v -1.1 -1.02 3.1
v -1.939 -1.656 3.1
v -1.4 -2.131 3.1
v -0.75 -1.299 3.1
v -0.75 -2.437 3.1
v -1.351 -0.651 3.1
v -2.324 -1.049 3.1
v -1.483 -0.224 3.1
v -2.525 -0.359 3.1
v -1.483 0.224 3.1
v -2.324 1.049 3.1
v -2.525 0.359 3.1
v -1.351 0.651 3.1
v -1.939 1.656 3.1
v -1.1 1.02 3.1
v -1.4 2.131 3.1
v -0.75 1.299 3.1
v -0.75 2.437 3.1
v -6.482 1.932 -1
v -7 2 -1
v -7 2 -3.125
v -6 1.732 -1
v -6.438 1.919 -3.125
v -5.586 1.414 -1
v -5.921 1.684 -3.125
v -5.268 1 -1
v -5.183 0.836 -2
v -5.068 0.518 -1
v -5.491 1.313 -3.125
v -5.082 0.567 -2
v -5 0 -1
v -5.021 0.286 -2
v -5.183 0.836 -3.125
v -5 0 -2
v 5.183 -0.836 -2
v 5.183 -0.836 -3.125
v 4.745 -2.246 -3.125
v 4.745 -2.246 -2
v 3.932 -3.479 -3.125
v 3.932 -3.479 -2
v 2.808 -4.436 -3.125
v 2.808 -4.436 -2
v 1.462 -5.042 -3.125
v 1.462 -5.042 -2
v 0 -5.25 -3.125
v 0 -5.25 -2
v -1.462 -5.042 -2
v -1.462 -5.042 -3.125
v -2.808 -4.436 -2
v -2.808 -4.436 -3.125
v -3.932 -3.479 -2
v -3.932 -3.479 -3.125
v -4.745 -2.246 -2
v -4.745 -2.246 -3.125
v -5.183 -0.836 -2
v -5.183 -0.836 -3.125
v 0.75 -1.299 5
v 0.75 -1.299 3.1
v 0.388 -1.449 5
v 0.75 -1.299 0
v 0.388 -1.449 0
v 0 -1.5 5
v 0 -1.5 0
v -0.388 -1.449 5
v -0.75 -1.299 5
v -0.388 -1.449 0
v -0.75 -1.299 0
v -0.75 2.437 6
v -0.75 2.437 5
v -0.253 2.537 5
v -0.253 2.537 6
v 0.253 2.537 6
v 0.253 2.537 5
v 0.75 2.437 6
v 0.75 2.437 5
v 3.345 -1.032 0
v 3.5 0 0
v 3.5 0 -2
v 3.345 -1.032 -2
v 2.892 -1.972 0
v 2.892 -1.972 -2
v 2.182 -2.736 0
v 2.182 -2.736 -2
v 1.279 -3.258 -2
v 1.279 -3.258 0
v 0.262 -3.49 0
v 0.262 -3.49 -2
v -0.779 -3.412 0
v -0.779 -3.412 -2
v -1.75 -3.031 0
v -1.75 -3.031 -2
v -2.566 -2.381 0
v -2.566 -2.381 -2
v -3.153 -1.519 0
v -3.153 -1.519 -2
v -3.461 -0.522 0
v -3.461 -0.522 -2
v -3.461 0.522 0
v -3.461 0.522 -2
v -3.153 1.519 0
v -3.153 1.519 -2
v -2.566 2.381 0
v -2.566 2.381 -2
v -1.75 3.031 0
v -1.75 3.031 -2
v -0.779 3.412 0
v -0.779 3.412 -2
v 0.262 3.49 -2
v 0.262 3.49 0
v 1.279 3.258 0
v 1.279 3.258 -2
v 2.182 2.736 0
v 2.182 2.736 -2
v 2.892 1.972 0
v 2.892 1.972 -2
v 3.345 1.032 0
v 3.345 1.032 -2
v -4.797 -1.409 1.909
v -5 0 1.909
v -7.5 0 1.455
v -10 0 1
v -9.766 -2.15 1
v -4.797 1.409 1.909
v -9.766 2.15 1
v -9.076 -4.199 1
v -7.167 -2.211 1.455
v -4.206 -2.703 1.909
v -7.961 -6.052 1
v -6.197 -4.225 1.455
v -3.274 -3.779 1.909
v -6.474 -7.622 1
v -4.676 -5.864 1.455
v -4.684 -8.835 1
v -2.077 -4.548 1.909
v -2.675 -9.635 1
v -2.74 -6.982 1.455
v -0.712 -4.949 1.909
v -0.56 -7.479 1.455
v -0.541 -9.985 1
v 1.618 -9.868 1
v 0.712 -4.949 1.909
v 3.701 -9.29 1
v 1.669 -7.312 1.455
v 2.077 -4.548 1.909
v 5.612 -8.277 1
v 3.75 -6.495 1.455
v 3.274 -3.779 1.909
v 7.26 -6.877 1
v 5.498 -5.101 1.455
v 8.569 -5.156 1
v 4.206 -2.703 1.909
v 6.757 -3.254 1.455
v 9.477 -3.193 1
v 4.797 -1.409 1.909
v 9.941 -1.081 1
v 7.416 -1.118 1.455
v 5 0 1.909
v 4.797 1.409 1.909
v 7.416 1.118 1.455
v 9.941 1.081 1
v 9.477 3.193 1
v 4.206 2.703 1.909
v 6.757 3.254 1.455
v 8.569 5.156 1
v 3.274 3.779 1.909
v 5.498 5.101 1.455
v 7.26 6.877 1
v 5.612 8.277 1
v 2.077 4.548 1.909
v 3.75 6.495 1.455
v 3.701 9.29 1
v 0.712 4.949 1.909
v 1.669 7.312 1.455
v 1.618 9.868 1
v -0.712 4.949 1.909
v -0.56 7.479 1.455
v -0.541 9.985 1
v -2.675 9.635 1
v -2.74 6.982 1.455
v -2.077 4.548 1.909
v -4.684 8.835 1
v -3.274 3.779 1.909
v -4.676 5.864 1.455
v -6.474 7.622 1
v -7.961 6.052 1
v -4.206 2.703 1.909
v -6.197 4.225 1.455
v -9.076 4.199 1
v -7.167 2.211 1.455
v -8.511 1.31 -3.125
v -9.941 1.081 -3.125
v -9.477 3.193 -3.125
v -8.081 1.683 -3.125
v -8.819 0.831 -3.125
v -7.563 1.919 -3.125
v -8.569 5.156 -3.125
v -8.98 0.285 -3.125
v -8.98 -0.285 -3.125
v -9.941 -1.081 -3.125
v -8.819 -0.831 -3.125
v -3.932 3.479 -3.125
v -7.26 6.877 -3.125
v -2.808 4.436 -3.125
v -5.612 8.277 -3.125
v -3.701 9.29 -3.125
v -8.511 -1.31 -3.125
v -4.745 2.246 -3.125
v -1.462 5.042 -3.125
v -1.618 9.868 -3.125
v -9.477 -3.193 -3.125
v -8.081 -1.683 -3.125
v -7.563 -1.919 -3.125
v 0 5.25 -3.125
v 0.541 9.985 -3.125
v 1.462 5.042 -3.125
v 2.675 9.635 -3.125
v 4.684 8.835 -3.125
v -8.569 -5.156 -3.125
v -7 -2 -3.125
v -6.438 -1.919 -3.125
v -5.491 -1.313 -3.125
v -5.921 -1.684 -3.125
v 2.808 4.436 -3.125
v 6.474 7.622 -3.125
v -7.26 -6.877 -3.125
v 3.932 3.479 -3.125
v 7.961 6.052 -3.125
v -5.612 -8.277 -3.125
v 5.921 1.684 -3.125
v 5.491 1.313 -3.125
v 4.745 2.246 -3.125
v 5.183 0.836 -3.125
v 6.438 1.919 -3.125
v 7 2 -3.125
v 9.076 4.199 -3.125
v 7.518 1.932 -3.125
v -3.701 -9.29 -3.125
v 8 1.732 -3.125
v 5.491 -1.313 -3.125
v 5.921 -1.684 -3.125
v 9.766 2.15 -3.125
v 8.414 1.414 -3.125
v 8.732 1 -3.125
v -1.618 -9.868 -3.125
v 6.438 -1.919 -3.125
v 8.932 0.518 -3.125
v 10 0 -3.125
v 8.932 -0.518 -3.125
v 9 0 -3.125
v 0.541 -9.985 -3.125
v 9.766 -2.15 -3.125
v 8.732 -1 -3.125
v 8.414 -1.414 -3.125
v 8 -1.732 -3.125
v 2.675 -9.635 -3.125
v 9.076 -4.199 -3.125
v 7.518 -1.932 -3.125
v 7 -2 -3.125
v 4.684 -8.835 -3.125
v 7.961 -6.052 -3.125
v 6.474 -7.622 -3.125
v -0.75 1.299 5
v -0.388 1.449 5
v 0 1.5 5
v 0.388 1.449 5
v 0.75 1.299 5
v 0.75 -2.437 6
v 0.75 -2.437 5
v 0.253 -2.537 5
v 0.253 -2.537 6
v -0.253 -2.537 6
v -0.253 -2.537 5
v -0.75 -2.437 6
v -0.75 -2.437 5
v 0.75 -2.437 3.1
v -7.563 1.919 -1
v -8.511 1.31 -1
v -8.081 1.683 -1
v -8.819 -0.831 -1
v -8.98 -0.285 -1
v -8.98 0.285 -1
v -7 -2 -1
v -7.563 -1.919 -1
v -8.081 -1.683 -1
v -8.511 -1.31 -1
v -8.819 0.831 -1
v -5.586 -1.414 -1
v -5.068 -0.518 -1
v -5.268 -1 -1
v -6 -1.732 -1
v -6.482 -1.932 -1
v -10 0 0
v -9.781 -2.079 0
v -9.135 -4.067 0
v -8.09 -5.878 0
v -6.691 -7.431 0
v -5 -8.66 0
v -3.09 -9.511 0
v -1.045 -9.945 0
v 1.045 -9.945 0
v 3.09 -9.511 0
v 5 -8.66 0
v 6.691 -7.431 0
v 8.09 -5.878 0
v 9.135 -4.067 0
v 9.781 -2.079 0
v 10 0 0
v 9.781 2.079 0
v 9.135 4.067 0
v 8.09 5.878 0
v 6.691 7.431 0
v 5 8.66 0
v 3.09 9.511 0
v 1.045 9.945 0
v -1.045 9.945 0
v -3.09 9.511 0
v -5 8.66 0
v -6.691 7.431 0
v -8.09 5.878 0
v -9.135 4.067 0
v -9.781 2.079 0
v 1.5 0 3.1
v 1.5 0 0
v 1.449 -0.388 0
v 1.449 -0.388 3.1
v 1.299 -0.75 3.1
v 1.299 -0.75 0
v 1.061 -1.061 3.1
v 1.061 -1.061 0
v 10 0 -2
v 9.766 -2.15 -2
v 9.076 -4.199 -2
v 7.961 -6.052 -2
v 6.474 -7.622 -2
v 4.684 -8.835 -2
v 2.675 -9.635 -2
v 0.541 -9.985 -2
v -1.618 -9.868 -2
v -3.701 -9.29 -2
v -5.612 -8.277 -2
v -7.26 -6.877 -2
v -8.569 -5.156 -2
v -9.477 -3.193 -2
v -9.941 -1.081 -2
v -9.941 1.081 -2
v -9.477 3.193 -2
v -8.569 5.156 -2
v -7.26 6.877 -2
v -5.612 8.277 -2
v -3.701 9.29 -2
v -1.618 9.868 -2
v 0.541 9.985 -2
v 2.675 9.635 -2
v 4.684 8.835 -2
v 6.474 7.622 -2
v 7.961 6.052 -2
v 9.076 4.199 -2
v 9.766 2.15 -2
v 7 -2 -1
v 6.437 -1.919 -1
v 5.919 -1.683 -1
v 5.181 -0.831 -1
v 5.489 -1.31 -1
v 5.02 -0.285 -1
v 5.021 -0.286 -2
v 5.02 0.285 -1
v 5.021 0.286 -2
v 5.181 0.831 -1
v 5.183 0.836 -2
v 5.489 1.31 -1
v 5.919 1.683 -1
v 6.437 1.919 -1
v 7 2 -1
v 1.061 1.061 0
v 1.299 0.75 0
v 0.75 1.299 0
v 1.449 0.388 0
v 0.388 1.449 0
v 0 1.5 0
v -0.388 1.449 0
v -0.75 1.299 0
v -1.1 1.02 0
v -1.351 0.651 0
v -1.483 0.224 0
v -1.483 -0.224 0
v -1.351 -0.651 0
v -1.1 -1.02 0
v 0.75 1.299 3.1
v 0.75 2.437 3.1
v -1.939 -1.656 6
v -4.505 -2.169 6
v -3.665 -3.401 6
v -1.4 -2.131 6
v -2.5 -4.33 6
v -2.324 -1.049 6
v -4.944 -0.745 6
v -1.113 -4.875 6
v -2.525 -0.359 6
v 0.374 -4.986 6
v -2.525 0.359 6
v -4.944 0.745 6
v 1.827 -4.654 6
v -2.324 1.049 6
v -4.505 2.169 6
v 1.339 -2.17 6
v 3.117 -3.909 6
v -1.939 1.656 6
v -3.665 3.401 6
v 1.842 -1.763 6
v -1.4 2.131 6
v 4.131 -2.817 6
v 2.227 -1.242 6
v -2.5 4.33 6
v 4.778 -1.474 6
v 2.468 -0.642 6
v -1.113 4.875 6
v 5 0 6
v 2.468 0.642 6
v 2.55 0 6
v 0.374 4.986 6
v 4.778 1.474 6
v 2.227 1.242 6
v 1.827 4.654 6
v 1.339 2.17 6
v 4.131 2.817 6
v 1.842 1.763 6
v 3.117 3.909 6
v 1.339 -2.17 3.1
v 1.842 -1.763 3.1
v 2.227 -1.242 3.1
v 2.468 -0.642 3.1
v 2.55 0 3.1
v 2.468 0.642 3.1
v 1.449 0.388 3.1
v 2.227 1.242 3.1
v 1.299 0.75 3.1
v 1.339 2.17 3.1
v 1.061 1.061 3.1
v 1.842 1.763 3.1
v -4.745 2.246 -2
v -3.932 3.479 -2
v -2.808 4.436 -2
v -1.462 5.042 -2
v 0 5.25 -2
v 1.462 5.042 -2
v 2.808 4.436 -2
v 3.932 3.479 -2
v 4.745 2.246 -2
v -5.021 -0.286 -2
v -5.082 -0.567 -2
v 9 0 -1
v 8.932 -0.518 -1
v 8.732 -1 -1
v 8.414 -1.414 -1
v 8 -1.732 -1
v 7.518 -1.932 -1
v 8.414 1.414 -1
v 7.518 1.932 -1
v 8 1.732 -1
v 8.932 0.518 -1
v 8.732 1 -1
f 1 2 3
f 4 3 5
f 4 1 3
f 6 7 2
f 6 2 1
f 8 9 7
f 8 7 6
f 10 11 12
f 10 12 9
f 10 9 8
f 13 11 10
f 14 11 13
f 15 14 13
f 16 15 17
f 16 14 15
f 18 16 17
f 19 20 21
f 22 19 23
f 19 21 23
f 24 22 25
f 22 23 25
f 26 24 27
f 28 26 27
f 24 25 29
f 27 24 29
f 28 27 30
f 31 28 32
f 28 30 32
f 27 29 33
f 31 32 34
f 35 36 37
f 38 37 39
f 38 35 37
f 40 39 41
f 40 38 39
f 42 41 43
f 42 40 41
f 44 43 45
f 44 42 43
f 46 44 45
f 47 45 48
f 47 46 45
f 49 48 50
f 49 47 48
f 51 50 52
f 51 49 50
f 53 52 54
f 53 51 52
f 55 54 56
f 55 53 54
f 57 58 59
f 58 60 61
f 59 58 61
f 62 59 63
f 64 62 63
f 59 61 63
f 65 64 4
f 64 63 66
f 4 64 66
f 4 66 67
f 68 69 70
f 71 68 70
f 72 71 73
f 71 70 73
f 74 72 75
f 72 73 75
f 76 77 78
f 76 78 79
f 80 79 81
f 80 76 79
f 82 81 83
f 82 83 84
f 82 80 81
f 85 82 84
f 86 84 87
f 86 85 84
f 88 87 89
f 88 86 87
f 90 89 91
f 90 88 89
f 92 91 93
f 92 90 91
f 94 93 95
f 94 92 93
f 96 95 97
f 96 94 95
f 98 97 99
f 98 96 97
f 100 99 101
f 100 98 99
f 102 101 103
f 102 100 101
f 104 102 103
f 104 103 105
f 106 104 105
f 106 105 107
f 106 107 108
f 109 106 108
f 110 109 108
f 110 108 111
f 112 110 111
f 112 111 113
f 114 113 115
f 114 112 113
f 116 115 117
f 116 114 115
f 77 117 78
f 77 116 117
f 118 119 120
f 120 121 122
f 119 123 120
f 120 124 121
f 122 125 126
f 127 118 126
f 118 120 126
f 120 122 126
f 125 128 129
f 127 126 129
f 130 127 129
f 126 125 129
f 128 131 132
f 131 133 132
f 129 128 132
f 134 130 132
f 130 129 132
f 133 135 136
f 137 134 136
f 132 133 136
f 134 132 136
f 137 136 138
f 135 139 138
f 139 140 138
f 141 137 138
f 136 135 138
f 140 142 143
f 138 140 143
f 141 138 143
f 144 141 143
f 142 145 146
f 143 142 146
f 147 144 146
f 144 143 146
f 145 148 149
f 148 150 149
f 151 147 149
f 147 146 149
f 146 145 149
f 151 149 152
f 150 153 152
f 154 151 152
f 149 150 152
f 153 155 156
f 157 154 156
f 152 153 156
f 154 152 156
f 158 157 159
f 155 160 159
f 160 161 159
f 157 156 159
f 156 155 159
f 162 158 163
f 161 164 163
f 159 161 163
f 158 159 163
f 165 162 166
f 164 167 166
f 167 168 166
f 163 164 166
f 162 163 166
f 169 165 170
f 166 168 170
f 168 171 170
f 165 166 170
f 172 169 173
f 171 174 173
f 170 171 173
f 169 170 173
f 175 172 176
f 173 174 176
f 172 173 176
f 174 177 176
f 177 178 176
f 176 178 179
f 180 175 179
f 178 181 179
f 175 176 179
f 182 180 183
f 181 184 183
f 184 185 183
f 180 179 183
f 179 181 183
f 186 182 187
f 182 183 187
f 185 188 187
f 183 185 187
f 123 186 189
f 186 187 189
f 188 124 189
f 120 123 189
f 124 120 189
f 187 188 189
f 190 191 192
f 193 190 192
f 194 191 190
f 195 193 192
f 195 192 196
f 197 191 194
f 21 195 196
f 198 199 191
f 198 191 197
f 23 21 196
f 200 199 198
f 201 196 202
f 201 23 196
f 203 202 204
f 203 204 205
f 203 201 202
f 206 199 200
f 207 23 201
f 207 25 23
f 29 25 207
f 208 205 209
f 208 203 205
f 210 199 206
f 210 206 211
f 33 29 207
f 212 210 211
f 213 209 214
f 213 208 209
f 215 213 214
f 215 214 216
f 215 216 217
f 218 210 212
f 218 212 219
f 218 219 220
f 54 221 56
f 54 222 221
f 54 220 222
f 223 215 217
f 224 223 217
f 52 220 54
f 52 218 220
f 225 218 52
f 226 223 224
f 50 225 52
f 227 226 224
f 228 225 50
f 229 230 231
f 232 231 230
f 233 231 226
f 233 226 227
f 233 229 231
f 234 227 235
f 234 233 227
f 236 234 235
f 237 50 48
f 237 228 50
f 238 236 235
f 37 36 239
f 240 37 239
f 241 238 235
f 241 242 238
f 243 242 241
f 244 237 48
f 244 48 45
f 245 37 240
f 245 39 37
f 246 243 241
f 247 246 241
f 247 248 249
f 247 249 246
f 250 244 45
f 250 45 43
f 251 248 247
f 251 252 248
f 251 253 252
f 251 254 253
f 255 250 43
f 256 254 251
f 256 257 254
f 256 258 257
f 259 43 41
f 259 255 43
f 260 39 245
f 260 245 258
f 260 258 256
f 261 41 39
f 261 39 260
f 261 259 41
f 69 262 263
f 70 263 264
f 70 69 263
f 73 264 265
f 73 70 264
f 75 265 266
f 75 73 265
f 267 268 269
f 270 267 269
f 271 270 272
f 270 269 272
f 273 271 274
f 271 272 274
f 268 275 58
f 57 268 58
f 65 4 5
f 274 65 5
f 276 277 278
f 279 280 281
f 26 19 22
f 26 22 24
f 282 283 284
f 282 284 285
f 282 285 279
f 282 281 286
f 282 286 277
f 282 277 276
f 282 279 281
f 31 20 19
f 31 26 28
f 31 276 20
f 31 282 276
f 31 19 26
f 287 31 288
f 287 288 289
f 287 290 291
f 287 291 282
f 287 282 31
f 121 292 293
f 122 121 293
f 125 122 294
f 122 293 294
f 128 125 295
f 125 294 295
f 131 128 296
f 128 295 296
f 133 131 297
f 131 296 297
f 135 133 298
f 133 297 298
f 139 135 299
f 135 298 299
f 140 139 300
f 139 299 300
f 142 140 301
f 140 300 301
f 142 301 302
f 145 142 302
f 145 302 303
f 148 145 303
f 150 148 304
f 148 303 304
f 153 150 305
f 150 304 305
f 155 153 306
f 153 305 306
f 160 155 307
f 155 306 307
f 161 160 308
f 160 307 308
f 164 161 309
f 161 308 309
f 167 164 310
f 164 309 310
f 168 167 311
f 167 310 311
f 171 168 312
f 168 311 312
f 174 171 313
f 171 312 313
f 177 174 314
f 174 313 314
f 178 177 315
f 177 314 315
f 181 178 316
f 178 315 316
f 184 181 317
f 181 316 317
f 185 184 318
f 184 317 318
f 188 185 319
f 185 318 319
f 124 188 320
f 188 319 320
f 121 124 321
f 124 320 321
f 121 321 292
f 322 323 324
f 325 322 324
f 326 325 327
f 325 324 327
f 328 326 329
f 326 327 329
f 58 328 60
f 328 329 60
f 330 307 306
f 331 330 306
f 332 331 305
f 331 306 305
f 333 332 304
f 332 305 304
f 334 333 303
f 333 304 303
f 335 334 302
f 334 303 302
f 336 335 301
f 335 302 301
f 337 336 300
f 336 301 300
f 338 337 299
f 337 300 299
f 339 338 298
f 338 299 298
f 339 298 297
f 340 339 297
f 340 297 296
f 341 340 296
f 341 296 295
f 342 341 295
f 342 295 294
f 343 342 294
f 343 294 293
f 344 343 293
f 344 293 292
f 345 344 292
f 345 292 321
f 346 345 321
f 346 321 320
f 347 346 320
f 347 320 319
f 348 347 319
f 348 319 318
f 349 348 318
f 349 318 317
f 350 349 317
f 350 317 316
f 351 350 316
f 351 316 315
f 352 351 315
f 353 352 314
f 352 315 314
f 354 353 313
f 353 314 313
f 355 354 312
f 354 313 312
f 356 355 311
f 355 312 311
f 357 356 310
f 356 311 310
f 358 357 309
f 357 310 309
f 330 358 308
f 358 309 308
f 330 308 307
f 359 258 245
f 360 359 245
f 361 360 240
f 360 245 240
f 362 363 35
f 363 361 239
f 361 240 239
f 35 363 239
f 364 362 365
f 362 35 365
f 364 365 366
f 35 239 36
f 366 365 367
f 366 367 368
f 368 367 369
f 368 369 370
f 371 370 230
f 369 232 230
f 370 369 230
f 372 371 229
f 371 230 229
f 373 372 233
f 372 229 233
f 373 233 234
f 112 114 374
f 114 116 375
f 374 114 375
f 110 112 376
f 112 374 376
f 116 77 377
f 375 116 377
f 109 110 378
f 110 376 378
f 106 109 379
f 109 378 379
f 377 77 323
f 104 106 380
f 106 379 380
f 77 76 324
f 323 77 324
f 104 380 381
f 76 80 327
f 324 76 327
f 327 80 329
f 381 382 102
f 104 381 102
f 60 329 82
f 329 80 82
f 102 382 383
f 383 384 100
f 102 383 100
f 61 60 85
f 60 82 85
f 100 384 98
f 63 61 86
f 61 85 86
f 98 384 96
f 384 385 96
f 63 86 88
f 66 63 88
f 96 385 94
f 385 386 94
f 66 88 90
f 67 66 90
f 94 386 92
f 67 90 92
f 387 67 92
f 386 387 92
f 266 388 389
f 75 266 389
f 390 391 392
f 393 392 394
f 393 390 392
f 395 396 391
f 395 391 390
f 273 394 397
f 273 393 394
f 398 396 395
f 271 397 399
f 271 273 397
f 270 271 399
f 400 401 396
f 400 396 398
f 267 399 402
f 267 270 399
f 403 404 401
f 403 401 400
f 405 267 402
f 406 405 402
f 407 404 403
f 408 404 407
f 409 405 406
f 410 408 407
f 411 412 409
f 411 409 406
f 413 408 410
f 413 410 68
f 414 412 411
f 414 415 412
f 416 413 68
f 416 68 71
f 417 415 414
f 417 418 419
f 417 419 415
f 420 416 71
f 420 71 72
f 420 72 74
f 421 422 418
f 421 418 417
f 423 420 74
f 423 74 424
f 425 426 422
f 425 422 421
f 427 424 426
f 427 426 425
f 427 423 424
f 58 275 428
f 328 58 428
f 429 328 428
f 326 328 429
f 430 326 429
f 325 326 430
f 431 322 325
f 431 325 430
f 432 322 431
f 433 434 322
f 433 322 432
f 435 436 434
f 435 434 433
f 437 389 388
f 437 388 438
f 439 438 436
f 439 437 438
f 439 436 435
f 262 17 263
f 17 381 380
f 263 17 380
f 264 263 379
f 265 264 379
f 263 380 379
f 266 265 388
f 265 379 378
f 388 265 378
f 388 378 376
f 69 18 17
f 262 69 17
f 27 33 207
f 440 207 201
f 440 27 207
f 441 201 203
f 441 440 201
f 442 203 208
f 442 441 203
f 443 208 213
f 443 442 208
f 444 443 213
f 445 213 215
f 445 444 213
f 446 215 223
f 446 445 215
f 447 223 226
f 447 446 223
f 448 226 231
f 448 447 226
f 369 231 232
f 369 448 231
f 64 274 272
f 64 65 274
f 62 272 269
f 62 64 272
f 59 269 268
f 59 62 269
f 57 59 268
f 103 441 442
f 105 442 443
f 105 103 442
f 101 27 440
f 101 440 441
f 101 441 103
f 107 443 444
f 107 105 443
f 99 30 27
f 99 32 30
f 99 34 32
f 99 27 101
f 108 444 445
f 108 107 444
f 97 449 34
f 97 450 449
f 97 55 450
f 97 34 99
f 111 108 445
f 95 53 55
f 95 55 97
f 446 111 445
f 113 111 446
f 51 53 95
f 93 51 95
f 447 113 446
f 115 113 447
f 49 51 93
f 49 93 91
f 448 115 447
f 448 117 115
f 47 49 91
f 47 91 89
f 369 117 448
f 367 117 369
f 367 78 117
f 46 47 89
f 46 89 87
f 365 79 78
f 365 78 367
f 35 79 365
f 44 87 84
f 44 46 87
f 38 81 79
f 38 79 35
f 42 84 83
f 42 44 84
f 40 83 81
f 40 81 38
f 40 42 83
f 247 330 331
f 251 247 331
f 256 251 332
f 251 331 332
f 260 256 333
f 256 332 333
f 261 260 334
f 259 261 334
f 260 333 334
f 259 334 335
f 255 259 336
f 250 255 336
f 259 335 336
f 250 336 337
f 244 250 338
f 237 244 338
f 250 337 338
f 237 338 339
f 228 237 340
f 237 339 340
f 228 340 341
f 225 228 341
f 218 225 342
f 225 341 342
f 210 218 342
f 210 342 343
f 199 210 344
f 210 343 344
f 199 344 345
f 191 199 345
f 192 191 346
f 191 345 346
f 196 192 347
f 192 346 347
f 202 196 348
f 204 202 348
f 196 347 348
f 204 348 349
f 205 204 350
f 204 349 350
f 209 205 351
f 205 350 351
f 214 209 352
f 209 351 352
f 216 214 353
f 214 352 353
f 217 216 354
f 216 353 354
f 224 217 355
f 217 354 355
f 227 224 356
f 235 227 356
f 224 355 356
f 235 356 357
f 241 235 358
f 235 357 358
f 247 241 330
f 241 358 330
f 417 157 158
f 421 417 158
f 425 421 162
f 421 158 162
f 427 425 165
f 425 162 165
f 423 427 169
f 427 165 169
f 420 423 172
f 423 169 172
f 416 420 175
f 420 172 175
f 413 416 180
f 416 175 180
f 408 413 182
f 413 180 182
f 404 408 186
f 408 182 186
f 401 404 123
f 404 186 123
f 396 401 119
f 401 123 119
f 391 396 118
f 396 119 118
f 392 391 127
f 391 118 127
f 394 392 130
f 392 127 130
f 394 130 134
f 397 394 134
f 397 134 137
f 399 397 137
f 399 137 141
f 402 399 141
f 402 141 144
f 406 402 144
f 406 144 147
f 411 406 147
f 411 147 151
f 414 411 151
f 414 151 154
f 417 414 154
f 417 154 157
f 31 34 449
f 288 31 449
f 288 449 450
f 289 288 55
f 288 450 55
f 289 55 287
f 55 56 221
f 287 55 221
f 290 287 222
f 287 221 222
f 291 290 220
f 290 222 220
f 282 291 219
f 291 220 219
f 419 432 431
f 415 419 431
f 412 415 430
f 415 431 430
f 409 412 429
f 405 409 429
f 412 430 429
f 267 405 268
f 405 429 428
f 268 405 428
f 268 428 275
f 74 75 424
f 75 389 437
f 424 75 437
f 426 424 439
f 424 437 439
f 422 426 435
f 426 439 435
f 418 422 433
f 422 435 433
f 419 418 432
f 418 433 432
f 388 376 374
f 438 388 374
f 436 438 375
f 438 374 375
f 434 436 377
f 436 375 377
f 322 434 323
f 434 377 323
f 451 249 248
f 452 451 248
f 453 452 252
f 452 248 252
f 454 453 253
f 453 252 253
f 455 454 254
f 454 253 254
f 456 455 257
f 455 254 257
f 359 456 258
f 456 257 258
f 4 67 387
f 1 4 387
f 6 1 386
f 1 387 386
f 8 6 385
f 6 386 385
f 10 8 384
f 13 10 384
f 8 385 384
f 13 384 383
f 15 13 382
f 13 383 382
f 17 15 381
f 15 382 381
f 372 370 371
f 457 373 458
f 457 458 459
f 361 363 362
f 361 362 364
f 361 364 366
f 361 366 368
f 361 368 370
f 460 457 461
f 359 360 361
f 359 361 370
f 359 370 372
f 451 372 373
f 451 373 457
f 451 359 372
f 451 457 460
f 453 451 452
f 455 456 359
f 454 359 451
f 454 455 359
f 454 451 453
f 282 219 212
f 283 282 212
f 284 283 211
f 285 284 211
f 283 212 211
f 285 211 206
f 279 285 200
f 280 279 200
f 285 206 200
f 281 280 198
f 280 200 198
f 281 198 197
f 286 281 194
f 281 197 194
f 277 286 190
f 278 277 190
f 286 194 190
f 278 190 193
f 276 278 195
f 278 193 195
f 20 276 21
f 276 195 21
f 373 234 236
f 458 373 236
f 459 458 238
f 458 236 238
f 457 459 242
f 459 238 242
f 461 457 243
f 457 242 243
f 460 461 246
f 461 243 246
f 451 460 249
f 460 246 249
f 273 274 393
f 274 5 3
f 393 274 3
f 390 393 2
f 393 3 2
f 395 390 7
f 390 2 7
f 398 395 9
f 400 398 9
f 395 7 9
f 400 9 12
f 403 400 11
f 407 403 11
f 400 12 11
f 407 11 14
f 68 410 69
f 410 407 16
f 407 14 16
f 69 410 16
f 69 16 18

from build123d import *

# Parameters (mm, degrees)
F0_R      = 5
F1_DEPTH  = 6
F2_DEPTH  = 5
F3_DEPTH  = 3.1
F6_R      = 10
F6_R_2    = 3.5
F7_DEPTH  = 2
F8_R      = 10
F8_R_2    = 5.25
F9_DEPTH  = 1.125
F11_DEPTH = 2.125


with BuildPart() as f1:
    # F0 (on Top) → F1 (new body)
    with BuildSketch(Plane.XY):
        Circle(F0_R)
        with BuildLine():
            ThreePointArc((0.75, 2.4372115214), (2.0512191497, 1.5149257408), (2.55, 0))
            ThreePointArc((2.55, 0), (2.0512191497, -1.5149257408), (0.75, -2.4372115214))
            ThreePointArc((0.75, -2.4372115214), (0, -2.55), (-0.75, -2.4372115214))
            ThreePointArc((-0.75, -2.4372115214), (-2.55, 0), (-0.75, 2.4372115214))
            ThreePointArc((-0.75, 2.4372115214), (0, 2.55), (0.75, 2.4372115214))
        make_face(mode=Mode.SUBTRACT)
    extrude(amount=F1_DEPTH)

    # F0 (on Top) → F2 (join)
    with BuildSketch(Plane.XY):
        with BuildLine():
            Line((0.75, 1.2990381057), (0.75, 2.4372115214))
            ThreePointArc((0.75, 2.4372115214), (0, 2.55), (-0.75, 2.4372115214))
            Line((-0.75, 2.4372115214), (-0.75, 1.2990381057))
            ThreePointArc((-0.75, 1.2990381057), (0, 1.5), (0.75, 1.2990381057))
        make_face()
        with BuildLine():
            ThreePointArc((-0.75, -2.4372115214), (0, -2.55), (0.75, -2.4372115214))
            Line((0.75, -2.4372115214), (0.75, -1.2990381057))
            ThreePointArc((0.75, -1.2990381057), (0, -1.5), (-0.75, -1.2990381057))
            Line((-0.75, -1.2990381057), (-0.75, -2.4372115214))
        make_face()
    extrude(amount=F2_DEPTH)

    # F0 (on Top) → F3 (join)
    with BuildSketch(Plane.XY):
        with BuildLine():
            Line((-0.75, 1.2990381057), (-0.75, 2.4372115214))
            ThreePointArc((-0.75, 2.4372115214), (-2.55, 0), (-0.75, -2.4372115214))
            Line((-0.75, -2.4372115214), (-0.75, -1.2990381057))
            ThreePointArc((-0.75, -1.2990381057), (-1.5, 0), (-0.75, 1.2990381057))
        make_face()
        with BuildLine():
            ThreePointArc((0.75, -2.4372115214), (2.0512191497, -1.5149257408), (2.55, 0))
            ThreePointArc((2.55, 0), (2.0512191497, 1.5149257408), (0.75, 2.4372115214))
            Line((0.75, 2.4372115214), (0.75, 1.2990381057))
            ThreePointArc((0.75, 1.2990381057), (1.2990381057, 0.75), (1.5, 0))
            ThreePointArc((1.5, 0), (1.2990381057, -0.75), (0.75, -1.2990381057))
            Line((0.75, -1.2990381057), (0.75, -2.4372115214))
        make_face()
    extrude(amount=F3_DEPTH)

    # F4 (on Front) → F5 (revolve)
    with BuildSketch(Plane.XZ):
        Polygon((-10, 0), (-4, 0), (-4, 2), (-4.5, 2), (-10, 1), align=None)
    revolve(axis=Axis((0, 0, 1.2425027974), (0, 0, 1)))

    # F6 (on face) → F7 (join)
    with BuildSketch(Plane(origin=(0, 0, 0), x_dir=(1, 0, 0), z_dir=(0, 0, -1))):
        Circle(F6_R)
        Circle(F6_R_2, mode=Mode.SUBTRACT)
    extrude(amount=F7_DEPTH)

    # F8 (on face) → F9 (join)
    with BuildSketch(Plane(origin=(0, 0, -2), x_dir=(1, 0, 0), z_dir=(0, 0, -1))):
        Circle(F8_R)
        Circle(F8_R_2, mode=Mode.SUBTRACT)
    extrude(amount=F9_DEPTH)

    # F10 (on face) → F11 (cut)
    with BuildSketch(Plane(origin=(0, 0, -3.125), x_dir=(1, 0, 0), z_dir=(0, 0, -1))):
        with BuildLine():
            ThreePointArc((-7, -2), (-5.5857864376, -1.4142135624), (-5, 0))
            ThreePointArc((-5, 0), (-5.5857864376, 1.4142135624), (-7, 2))
            ThreePointArc((-7, 2), (-9, 0), (-7, -2))
        make_face()
        with BuildLine():
            ThreePointArc((7, -2), (8.4142135624, -1.4142135624), (9, 0))
            ThreePointArc((9, 0), (8.4142135624, 1.4142135624), (7, 2))
            ThreePointArc((7, 2), (5, 0), (7, -2))
        make_face()
    extrude(amount=-F11_DEPTH, mode=Mode.SUBTRACT)


solid = f1.part
